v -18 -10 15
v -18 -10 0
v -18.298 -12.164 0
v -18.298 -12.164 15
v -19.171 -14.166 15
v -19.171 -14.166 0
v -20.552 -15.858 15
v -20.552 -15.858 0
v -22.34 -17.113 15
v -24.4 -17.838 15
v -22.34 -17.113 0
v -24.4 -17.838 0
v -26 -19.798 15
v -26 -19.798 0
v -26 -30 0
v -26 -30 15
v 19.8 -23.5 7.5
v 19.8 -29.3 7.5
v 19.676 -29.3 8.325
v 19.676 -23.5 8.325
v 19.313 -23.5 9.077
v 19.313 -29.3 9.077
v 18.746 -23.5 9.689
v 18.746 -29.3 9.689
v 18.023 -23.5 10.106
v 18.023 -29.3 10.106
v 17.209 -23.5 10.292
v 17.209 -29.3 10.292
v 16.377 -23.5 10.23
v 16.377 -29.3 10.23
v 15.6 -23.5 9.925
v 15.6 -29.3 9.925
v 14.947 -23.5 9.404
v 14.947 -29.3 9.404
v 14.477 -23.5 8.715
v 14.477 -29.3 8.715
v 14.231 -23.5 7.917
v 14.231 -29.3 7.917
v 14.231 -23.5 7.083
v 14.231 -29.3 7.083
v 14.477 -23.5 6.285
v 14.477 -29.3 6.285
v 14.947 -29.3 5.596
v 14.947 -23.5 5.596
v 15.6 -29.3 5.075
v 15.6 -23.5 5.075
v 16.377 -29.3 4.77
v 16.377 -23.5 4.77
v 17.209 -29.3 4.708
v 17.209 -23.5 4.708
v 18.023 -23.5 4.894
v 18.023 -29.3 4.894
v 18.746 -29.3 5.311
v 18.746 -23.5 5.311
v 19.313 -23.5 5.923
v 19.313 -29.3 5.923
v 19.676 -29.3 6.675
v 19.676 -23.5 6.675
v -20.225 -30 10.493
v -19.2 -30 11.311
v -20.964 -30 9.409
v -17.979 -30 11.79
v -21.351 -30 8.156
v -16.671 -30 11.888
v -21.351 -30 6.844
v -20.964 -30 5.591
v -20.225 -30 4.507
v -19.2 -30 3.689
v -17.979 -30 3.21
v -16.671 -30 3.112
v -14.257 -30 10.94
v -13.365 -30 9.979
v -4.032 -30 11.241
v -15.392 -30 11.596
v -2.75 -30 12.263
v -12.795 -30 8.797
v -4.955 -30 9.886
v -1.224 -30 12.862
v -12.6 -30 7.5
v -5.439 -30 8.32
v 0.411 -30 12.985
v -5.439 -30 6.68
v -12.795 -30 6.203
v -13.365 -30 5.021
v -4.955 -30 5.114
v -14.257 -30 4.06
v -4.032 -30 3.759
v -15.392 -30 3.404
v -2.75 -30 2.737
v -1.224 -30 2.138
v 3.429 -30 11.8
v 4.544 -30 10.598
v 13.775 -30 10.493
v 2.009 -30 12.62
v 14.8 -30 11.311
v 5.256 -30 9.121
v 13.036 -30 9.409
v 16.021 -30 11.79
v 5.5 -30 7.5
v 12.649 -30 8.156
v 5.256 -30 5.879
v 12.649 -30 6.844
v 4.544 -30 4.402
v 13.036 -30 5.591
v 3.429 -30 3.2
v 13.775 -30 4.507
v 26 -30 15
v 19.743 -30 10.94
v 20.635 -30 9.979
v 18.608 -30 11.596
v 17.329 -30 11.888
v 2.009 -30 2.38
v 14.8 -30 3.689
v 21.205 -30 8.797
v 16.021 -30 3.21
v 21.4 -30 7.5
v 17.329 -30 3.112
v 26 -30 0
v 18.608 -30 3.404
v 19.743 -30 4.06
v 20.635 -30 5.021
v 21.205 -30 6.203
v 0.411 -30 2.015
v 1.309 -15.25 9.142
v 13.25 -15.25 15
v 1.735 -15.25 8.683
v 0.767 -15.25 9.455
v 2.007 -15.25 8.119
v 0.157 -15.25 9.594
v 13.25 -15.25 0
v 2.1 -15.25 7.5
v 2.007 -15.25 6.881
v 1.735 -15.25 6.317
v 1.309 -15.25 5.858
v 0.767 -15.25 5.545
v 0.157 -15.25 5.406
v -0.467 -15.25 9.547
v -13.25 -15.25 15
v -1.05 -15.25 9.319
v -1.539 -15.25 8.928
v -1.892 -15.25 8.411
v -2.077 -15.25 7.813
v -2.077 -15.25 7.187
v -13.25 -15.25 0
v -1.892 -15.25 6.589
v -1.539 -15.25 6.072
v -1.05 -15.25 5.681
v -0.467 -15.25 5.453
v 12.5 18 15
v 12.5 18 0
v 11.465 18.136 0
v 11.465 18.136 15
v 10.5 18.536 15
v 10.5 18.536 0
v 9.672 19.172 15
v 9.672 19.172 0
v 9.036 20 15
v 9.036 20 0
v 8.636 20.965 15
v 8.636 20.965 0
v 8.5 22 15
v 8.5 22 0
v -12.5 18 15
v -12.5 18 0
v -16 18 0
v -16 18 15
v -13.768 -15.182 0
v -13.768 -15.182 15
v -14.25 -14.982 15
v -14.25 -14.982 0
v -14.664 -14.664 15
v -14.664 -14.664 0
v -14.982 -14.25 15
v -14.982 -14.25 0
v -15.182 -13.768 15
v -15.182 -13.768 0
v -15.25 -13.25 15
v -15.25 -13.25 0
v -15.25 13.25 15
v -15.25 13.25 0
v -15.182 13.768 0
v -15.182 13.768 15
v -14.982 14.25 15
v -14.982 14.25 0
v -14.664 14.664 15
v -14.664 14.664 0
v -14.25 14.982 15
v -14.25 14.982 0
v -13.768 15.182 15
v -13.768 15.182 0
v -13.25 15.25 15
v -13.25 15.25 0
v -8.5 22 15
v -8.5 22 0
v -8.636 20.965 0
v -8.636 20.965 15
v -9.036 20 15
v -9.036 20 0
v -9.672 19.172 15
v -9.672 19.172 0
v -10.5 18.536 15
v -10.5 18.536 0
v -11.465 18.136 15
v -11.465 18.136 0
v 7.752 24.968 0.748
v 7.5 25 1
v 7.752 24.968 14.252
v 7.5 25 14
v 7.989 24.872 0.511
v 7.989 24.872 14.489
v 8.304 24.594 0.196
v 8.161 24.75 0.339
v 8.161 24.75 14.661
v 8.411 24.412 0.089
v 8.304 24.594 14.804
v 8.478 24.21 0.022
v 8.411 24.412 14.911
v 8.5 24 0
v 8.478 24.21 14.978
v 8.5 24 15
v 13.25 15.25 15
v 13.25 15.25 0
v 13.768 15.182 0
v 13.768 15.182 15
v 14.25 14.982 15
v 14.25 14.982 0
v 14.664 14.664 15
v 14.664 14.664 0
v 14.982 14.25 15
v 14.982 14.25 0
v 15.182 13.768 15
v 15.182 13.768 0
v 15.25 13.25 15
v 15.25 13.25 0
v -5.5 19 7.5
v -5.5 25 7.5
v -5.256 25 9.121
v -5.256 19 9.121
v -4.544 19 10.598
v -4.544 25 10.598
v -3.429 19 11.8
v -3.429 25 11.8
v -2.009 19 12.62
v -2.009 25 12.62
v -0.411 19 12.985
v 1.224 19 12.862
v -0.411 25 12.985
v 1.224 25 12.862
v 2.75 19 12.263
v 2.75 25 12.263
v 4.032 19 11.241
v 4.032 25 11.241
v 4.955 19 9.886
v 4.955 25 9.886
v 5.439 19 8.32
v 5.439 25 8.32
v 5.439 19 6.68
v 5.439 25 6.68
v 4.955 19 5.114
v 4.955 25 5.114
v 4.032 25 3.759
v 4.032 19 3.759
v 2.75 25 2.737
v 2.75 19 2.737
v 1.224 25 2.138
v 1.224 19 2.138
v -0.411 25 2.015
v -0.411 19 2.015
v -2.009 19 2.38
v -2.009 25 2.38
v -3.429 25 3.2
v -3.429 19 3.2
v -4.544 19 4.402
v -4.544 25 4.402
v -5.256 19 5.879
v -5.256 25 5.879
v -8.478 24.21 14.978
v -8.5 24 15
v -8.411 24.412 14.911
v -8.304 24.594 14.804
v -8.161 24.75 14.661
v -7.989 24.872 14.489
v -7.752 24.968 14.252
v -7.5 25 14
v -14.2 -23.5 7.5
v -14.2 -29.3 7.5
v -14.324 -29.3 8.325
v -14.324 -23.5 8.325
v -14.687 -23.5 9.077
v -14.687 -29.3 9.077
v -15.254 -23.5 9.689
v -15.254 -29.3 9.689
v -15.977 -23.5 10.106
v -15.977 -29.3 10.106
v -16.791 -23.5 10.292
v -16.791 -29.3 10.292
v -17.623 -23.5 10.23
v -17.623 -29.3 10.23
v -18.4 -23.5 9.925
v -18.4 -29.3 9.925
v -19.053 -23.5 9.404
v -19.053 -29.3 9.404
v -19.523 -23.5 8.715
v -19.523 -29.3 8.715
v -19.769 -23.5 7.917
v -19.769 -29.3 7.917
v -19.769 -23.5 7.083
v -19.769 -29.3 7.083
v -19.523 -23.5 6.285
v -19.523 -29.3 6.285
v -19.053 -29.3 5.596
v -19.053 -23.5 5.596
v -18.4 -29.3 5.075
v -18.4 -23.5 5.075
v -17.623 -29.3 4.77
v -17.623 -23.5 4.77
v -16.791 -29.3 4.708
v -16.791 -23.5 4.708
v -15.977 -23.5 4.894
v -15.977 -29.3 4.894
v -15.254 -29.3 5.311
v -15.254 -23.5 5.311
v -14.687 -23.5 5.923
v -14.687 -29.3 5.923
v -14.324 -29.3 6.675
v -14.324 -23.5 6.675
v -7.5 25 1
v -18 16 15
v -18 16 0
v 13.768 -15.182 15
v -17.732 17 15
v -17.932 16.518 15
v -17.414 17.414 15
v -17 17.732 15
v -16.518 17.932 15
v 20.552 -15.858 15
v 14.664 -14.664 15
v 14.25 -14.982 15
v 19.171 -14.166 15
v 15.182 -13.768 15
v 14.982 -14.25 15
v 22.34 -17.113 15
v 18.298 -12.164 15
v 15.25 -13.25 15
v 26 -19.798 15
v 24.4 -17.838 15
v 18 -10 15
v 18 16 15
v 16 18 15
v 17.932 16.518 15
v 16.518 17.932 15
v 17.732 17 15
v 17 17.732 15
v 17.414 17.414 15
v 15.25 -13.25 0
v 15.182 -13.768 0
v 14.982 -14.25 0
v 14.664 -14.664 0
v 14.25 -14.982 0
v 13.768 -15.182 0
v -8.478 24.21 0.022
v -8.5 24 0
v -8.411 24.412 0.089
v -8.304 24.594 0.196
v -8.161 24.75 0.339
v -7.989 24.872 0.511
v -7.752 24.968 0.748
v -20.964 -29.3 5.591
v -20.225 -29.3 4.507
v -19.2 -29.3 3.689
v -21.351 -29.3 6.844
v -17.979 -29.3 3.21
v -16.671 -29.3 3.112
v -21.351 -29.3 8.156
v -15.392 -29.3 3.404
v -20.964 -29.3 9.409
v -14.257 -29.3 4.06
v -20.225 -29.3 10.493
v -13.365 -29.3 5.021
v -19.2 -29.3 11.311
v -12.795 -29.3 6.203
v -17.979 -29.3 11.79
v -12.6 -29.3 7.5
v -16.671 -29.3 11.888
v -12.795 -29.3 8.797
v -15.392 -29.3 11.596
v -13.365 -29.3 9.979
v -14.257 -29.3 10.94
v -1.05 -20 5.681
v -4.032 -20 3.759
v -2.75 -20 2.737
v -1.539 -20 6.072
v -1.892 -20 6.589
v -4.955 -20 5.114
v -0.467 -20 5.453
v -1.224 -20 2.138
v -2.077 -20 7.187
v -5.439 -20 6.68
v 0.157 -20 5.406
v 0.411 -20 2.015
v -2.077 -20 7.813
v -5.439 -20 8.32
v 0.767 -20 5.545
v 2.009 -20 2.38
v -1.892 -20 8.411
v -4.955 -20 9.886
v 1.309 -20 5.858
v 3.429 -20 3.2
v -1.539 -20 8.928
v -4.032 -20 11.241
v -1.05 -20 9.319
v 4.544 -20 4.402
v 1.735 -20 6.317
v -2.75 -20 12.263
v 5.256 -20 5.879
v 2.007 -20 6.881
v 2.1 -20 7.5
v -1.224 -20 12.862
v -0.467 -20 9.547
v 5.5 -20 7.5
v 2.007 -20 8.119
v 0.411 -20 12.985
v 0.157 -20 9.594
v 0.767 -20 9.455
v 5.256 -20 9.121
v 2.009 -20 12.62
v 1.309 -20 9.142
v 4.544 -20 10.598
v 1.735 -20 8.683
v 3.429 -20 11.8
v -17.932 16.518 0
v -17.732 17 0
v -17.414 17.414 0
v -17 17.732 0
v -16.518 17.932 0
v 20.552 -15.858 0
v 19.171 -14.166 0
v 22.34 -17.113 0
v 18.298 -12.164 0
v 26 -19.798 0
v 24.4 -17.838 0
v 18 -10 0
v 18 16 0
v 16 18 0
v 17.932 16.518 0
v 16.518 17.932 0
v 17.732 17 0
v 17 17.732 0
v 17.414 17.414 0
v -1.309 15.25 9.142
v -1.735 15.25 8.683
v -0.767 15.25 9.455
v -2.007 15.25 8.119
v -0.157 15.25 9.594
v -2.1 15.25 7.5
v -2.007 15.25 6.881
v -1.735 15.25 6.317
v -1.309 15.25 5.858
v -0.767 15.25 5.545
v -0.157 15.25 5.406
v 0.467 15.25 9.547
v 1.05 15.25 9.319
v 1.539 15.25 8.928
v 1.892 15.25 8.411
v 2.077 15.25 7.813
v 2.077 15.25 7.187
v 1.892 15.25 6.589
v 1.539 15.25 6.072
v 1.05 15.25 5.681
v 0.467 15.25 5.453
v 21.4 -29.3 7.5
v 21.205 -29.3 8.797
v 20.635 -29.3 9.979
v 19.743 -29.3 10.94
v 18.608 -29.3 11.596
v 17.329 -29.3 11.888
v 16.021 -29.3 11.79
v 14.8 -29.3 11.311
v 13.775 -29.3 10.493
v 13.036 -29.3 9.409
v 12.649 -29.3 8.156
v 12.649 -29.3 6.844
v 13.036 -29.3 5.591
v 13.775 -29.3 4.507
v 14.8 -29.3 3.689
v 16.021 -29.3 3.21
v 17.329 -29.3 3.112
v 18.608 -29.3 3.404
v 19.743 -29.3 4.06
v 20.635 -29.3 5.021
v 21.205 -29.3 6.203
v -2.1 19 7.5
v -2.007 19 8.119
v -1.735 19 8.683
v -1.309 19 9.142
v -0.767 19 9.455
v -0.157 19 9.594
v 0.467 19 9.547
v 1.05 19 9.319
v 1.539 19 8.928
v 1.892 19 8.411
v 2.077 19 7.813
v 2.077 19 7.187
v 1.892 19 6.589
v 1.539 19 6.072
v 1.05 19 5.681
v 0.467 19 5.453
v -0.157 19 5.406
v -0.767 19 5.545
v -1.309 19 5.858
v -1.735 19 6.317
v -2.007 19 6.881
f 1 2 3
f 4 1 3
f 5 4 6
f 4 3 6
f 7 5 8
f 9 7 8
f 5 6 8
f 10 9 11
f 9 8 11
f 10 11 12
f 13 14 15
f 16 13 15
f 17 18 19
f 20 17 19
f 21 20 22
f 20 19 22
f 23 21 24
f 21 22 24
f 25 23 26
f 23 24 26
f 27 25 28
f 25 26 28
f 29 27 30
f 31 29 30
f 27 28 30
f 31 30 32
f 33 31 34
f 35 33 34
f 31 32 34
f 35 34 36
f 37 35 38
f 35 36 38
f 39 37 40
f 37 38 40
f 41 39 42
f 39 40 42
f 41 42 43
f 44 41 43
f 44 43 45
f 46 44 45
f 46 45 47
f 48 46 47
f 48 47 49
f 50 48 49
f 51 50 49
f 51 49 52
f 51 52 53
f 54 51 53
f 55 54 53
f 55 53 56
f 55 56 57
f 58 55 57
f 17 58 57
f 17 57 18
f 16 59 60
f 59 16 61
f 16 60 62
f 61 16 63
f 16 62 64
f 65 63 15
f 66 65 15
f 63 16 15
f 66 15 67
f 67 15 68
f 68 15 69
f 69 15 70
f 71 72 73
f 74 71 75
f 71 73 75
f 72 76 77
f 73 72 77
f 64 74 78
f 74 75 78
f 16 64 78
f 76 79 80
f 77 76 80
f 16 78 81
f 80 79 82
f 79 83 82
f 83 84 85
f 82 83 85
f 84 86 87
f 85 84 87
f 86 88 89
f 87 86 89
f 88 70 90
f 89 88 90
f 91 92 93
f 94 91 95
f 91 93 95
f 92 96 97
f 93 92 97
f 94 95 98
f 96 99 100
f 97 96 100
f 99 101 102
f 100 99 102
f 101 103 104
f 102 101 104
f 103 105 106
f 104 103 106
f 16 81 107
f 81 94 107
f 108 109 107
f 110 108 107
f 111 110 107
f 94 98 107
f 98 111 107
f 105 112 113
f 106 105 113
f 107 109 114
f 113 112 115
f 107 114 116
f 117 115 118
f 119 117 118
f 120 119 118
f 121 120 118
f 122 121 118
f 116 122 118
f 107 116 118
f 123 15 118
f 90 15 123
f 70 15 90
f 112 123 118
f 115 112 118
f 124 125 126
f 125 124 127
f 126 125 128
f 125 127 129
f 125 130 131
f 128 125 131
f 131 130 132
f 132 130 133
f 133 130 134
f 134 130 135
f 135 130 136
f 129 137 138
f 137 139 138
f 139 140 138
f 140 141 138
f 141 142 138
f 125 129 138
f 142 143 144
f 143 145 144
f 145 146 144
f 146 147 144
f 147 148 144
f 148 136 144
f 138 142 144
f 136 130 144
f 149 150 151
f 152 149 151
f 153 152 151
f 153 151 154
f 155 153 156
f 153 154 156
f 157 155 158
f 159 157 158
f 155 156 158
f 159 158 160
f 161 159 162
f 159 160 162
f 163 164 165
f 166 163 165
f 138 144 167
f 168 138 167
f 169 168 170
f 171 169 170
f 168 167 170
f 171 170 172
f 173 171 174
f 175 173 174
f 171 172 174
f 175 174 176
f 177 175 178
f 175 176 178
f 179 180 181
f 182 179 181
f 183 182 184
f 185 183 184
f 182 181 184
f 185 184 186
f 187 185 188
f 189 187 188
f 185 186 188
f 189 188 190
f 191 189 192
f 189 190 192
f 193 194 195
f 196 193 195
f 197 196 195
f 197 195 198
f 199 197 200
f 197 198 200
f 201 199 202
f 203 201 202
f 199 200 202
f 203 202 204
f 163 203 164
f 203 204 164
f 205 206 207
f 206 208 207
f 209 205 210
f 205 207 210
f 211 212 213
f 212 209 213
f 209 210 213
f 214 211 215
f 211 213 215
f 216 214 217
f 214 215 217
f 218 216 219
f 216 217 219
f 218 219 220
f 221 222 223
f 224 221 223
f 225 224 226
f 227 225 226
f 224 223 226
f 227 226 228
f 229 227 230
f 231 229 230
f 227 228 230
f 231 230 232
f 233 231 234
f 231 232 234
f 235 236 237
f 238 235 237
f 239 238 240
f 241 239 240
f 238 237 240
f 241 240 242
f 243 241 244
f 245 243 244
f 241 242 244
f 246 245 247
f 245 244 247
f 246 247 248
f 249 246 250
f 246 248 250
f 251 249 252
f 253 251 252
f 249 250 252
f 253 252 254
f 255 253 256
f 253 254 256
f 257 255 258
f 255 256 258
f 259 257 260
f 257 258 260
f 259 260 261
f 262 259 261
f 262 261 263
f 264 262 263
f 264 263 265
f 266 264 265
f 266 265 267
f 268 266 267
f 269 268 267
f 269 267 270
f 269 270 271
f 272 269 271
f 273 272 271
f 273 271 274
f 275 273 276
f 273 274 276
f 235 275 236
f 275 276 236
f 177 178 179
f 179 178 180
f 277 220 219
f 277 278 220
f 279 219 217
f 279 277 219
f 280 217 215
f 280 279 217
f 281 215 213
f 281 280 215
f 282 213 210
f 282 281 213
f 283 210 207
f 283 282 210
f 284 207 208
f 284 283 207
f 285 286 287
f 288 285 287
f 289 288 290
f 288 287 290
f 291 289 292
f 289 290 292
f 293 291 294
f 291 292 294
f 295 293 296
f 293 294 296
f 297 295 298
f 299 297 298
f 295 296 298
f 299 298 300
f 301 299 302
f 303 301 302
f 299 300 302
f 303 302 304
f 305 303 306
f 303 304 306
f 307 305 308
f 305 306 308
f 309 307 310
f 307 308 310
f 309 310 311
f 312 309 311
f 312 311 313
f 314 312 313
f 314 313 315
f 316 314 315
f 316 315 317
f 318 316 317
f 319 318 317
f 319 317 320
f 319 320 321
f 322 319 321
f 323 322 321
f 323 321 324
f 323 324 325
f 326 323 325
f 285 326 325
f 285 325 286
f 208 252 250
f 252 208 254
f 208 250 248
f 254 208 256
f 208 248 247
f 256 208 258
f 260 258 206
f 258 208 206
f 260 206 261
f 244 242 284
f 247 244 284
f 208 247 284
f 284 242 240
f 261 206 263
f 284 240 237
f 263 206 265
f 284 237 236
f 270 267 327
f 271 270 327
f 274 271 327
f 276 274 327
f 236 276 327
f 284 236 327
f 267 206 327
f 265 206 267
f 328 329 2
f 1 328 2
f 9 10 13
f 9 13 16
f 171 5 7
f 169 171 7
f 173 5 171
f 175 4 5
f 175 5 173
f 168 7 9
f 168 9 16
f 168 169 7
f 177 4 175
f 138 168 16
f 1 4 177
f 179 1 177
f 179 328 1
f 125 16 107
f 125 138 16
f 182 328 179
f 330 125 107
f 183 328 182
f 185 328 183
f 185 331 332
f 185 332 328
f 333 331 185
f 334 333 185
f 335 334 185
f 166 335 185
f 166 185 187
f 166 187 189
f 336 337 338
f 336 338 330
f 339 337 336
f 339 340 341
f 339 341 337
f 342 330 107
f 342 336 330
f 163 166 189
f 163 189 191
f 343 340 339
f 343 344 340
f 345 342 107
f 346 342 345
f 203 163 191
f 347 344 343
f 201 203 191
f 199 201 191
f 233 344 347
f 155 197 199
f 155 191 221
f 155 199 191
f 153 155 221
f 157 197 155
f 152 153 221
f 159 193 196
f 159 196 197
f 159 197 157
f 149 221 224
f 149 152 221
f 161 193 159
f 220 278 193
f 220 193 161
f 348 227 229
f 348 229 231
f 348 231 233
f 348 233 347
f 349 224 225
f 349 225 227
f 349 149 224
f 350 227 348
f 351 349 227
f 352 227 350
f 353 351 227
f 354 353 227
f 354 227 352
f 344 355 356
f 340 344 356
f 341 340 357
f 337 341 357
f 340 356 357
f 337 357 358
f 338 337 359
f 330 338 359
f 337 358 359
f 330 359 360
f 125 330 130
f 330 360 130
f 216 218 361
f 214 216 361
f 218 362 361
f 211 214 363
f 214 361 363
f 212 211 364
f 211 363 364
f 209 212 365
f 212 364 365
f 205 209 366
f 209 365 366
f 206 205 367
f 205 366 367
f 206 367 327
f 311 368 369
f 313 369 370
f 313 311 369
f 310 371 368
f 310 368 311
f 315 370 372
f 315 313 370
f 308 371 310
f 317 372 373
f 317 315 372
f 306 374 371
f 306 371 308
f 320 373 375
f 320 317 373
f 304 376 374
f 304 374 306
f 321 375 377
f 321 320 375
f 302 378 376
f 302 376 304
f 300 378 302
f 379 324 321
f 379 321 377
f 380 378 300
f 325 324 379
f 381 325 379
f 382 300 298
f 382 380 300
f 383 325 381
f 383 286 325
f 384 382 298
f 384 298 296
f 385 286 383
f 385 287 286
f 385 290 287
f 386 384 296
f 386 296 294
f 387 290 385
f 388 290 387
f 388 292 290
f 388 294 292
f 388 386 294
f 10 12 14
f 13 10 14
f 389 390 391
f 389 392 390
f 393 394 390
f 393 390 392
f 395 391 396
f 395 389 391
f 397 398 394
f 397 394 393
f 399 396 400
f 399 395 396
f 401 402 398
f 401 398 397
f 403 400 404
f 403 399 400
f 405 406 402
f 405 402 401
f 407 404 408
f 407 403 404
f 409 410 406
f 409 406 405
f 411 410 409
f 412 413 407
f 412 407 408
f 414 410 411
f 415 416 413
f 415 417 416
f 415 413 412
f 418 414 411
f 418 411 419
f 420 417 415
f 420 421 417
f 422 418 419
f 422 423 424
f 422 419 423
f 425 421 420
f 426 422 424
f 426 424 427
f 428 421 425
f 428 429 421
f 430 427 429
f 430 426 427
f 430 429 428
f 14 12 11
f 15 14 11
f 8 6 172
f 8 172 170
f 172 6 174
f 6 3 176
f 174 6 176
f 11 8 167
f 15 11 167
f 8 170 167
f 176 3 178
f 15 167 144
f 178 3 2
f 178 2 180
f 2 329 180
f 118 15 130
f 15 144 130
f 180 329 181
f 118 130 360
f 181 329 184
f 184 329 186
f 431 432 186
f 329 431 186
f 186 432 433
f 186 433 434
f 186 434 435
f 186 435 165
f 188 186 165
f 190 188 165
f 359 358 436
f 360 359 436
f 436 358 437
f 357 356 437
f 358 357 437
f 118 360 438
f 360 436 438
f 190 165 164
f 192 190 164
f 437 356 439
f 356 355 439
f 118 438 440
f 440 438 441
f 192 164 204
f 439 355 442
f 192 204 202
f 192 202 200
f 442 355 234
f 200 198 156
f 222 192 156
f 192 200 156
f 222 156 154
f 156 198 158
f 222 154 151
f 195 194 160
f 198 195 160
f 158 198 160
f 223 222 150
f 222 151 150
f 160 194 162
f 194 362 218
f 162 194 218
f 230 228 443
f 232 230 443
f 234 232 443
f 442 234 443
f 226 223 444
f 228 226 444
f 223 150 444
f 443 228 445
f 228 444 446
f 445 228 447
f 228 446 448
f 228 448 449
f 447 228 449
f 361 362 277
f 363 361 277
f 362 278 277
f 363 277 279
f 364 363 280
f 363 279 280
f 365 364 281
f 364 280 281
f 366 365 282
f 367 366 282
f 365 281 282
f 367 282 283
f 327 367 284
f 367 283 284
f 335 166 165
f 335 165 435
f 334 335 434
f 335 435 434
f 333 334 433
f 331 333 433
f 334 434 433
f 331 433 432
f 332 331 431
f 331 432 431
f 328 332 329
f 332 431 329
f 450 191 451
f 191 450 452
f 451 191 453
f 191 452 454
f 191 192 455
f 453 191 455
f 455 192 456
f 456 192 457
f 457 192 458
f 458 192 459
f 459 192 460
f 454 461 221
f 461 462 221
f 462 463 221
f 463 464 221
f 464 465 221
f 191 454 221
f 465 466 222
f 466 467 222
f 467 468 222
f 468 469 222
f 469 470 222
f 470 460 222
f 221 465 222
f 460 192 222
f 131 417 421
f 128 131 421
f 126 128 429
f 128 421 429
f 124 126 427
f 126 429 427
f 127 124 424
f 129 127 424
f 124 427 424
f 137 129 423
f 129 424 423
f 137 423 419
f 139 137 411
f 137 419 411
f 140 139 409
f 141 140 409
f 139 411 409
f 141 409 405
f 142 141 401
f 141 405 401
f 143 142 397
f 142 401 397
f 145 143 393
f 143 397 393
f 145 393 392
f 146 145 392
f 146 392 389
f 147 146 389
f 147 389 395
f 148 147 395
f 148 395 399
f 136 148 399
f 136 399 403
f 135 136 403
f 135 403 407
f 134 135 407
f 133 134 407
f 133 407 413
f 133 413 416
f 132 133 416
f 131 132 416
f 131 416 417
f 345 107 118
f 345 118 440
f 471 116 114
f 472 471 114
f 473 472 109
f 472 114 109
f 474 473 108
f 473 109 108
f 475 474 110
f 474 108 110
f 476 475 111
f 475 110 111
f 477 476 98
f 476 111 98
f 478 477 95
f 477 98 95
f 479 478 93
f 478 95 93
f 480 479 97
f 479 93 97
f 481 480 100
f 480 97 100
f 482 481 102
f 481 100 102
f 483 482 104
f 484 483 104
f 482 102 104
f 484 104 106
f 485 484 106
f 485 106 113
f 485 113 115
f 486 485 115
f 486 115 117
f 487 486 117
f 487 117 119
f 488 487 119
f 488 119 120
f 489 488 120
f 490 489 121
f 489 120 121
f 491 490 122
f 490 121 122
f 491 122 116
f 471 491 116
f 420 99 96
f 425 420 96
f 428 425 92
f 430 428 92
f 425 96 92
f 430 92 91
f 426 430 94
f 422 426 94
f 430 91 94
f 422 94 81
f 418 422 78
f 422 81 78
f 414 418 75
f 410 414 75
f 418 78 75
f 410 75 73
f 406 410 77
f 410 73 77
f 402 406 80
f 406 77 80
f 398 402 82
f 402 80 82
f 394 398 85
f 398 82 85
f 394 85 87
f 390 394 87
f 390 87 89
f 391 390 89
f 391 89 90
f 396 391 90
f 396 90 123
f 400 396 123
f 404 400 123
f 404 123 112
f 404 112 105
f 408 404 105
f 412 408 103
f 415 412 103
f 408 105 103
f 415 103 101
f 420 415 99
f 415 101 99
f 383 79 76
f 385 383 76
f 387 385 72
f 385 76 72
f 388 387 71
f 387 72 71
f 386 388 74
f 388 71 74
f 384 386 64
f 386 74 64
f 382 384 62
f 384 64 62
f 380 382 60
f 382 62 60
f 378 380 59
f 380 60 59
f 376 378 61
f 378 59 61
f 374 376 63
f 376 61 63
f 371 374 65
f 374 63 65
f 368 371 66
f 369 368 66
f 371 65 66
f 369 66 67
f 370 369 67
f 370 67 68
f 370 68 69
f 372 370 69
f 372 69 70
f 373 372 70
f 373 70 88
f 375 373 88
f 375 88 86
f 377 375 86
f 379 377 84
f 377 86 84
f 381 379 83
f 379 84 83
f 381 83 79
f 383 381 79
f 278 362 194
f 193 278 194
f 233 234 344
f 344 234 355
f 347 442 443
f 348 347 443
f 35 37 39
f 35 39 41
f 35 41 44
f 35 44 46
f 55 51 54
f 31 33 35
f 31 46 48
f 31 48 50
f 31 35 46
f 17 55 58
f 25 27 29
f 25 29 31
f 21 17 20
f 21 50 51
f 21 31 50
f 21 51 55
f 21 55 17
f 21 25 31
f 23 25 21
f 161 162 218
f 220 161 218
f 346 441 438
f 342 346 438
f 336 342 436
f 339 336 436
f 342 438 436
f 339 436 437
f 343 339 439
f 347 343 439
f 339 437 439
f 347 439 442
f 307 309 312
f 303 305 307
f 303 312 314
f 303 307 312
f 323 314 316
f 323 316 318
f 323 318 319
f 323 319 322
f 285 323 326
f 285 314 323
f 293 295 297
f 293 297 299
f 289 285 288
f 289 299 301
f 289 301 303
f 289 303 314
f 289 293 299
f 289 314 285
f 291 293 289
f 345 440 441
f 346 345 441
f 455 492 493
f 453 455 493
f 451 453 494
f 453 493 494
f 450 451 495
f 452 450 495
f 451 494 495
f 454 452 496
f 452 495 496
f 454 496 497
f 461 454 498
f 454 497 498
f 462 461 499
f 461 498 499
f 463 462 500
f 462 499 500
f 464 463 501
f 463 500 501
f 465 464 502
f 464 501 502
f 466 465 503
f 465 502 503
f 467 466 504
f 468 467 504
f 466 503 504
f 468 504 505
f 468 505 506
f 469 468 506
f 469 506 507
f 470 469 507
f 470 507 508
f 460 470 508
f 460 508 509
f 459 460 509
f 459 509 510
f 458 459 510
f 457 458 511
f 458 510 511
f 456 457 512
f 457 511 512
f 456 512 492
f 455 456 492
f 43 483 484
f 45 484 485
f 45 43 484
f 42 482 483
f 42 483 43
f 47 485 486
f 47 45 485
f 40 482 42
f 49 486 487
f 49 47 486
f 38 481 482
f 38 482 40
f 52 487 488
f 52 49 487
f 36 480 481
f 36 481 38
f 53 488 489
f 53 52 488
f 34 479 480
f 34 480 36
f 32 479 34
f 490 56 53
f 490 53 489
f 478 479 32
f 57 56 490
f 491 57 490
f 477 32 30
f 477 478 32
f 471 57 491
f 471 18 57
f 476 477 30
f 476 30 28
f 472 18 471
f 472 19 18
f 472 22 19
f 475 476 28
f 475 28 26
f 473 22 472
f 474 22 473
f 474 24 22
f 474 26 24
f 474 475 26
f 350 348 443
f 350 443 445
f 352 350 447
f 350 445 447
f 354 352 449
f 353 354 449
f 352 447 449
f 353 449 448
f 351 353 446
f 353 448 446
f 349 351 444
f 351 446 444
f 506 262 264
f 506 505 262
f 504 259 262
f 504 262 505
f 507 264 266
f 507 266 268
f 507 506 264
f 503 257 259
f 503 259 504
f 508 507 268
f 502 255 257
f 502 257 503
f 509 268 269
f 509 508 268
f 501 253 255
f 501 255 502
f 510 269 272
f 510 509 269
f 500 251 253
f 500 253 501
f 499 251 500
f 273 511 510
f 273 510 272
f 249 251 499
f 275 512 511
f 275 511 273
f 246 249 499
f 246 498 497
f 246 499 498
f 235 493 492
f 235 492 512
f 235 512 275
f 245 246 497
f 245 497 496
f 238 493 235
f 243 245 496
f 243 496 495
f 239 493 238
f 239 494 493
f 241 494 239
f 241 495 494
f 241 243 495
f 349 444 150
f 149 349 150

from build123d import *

# Parameters (mm, degrees)
F1_DEPTH       = 15
F2_T1_DEPTH    = 24.3030738828
F4_R           = 5.5
F5_DEPTH       = 6
F6_R           = 1
F7_R           = 2.1
F8_DEPTH       = 3.75
F9_R           = 5.5
F10_DEPTH      = 10
F10_DEPTH_BACK = 25
F11_R          = 2.1
F12_DEPTH      = 14.75
F3_R           = 2.8
F13_DEPTH      = 6.5
F14_R          = 4.4
F15_DEPTH      = 0.7


# Not quite as in the source:
# - a fillet or chamfer that OpenCascade refuses, or shapes differently, is made with other operations: its cross-section is extruded or revolved along the edge and cut away or added


with BuildPart() as f1:
    # F0 (on Top) → F1 (new body)
    with BuildSketch(Plane.XY):
        with BuildLine():
            ThreePointArc((18, 16), (17.4142135624, 17.4142135624), (16, 18))
            Line((16, 18), (12.5, 18))
            ThreePointArc((12.5, 18), (9.6715728753, 19.1715728753), (8.5, 22))
            Line((8.5, 22), (8.5, 25))
            Line((8.5, 25), (-8.5, 25))
            Line((-8.5, 25), (-8.5, 22))
            ThreePointArc((-8.5, 22), (-9.6715728753, 19.1715728753), (-12.5, 18))
            Line((-12.5, 18), (-16, 18))
            ThreePointArc((-16, 18), (-17.4142135624, 17.4142135624), (-18, 16))
            Line((-18, 16), (-18, -10))
            ThreePointArc((-18, -10), (-20.3431457505, -15.6568542495), (-26, -18))
            Line((-26, -18), (-26, -30))
            Line((-26, -30), (26, -30))
            Line((26, -30), (26, -18))
            ThreePointArc((26, -18), (20.3431457505, -15.6568542495), (18, -10))
            Line((18, -10), (18, 16))
        make_face()
        with BuildLine():
            Line((-13.25, 15.25), (13.25, 15.25))
            ThreePointArc((13.25, 15.25), (14.6642135624, 14.6642135624), (15.25, 13.25))
            Line((15.25, 13.25), (15.25, -13.25))
            ThreePointArc((15.25, -13.25), (14.6642135624, -14.6642135624), (13.25, -15.25))
            Line((13.25, -15.25), (-13.25, -15.25))
            ThreePointArc((-13.25, -15.25), (-14.6642135624, -14.6642135624), (-15.25, -13.25))
            Line((-15.25, -13.25), (-15.25, 13.25))
            ThreePointArc((-15.25, 13.25), (-14.6642135624, 14.6642135624), (-13.25, 15.25))
        make_face(mode=Mode.SUBTRACT)
    extrude(amount=F1_DEPTH)

    # F2: chamfer of 2 on 2 edges, made by hand

    # F2_s2 → F2_t1 (cut)
    with BuildSketch(Plane.XY.offset(-4.6515369414)):
        with BuildLine():
            Line((-24.4, -17.8383671769), (-26, -19.7979589711))
            Line((-26, -19.7979589711), (-26, -18))
            ThreePointArc((-26, -18), (-25.1675484588, -17.9565711479), (-24.4, -17.8383671769))
        make_face()
        with BuildLine():
            Line((26, -19.7979589711), (24.4, -17.8383671769))
            ThreePointArc((24.4, -17.8383671769), (25.1675484588, -17.9565711479), (26, -18))
            Line((26, -18), (26, -19.7979589711))
        make_face()
    extrude(amount=F2_T1_DEPTH, mode=Mode.SUBTRACT)

    # F4 (on face) → F5 (cut)
    with BuildSketch(Plane(origin=(0, 25, 0), x_dir=(-1, 0, 0), z_dir=(0, 1, 0))):
        with Locations((0, 7.5)):
            Circle(F4_R)
    extrude(amount=-F5_DEPTH, mode=Mode.SUBTRACT)

    # F6
    f6_edges = [f1.edges().sort_by_distance(p)[0] for p in [
        (0, 25, 0),
        (-8.5, 25, 7.5),
        (0, 25, 15),
        (8.5, 25, 7.5),
    ]]
    fillet(f6_edges, radius=F6_R)

    # F7 (on face) → F8 (cut, through all)
    with BuildSketch(Plane(origin=(0, 19, 0), x_dir=(-1, 0, 0), z_dir=(0, 1, 0))):
        with Locations((0, 7.5)):
            Circle(F7_R)
    extrude(amount=-F8_DEPTH, mode=Mode.SUBTRACT)

    # F9 (on face) → F10 (cut, two sides)
    with BuildSketch(Plane.XZ.offset(30)) as f10_sk:
        with Locations((0, 7.5)):
            Circle(F9_R)
    extrude(amount=-F10_DEPTH, mode=Mode.SUBTRACT)
    extrude(f10_sk.sketch, amount=F10_DEPTH_BACK, mode=Mode.SUBTRACT)

    # F11 (on face) → F12 (cut, through all)
    with BuildSketch(Plane.XZ.offset(30)):
        with Locations((0, 7.5)):
            Circle(F11_R)
    extrude(amount=-F12_DEPTH, mode=Mode.SUBTRACT)

    # F3 (on face) → F13 (cut)
    with BuildSketch(Plane.XZ.offset(30)):
        with Locations((-17, 7.5)):
            Circle(F3_R)
        with Locations((17, 7.5)):
            Circle(F3_R)
    extrude(amount=-F13_DEPTH, mode=Mode.SUBTRACT)

    # F14 (on face) → F15 (cut)
    with BuildSketch(Plane.XZ.offset(30)):
        with Locations((17, 7.5)):
            Circle(F14_R)
        with Locations((-17, 7.5)):
            Circle(F14_R)
    extrude(amount=-F15_DEPTH, mode=Mode.SUBTRACT)


solid = f1.part
